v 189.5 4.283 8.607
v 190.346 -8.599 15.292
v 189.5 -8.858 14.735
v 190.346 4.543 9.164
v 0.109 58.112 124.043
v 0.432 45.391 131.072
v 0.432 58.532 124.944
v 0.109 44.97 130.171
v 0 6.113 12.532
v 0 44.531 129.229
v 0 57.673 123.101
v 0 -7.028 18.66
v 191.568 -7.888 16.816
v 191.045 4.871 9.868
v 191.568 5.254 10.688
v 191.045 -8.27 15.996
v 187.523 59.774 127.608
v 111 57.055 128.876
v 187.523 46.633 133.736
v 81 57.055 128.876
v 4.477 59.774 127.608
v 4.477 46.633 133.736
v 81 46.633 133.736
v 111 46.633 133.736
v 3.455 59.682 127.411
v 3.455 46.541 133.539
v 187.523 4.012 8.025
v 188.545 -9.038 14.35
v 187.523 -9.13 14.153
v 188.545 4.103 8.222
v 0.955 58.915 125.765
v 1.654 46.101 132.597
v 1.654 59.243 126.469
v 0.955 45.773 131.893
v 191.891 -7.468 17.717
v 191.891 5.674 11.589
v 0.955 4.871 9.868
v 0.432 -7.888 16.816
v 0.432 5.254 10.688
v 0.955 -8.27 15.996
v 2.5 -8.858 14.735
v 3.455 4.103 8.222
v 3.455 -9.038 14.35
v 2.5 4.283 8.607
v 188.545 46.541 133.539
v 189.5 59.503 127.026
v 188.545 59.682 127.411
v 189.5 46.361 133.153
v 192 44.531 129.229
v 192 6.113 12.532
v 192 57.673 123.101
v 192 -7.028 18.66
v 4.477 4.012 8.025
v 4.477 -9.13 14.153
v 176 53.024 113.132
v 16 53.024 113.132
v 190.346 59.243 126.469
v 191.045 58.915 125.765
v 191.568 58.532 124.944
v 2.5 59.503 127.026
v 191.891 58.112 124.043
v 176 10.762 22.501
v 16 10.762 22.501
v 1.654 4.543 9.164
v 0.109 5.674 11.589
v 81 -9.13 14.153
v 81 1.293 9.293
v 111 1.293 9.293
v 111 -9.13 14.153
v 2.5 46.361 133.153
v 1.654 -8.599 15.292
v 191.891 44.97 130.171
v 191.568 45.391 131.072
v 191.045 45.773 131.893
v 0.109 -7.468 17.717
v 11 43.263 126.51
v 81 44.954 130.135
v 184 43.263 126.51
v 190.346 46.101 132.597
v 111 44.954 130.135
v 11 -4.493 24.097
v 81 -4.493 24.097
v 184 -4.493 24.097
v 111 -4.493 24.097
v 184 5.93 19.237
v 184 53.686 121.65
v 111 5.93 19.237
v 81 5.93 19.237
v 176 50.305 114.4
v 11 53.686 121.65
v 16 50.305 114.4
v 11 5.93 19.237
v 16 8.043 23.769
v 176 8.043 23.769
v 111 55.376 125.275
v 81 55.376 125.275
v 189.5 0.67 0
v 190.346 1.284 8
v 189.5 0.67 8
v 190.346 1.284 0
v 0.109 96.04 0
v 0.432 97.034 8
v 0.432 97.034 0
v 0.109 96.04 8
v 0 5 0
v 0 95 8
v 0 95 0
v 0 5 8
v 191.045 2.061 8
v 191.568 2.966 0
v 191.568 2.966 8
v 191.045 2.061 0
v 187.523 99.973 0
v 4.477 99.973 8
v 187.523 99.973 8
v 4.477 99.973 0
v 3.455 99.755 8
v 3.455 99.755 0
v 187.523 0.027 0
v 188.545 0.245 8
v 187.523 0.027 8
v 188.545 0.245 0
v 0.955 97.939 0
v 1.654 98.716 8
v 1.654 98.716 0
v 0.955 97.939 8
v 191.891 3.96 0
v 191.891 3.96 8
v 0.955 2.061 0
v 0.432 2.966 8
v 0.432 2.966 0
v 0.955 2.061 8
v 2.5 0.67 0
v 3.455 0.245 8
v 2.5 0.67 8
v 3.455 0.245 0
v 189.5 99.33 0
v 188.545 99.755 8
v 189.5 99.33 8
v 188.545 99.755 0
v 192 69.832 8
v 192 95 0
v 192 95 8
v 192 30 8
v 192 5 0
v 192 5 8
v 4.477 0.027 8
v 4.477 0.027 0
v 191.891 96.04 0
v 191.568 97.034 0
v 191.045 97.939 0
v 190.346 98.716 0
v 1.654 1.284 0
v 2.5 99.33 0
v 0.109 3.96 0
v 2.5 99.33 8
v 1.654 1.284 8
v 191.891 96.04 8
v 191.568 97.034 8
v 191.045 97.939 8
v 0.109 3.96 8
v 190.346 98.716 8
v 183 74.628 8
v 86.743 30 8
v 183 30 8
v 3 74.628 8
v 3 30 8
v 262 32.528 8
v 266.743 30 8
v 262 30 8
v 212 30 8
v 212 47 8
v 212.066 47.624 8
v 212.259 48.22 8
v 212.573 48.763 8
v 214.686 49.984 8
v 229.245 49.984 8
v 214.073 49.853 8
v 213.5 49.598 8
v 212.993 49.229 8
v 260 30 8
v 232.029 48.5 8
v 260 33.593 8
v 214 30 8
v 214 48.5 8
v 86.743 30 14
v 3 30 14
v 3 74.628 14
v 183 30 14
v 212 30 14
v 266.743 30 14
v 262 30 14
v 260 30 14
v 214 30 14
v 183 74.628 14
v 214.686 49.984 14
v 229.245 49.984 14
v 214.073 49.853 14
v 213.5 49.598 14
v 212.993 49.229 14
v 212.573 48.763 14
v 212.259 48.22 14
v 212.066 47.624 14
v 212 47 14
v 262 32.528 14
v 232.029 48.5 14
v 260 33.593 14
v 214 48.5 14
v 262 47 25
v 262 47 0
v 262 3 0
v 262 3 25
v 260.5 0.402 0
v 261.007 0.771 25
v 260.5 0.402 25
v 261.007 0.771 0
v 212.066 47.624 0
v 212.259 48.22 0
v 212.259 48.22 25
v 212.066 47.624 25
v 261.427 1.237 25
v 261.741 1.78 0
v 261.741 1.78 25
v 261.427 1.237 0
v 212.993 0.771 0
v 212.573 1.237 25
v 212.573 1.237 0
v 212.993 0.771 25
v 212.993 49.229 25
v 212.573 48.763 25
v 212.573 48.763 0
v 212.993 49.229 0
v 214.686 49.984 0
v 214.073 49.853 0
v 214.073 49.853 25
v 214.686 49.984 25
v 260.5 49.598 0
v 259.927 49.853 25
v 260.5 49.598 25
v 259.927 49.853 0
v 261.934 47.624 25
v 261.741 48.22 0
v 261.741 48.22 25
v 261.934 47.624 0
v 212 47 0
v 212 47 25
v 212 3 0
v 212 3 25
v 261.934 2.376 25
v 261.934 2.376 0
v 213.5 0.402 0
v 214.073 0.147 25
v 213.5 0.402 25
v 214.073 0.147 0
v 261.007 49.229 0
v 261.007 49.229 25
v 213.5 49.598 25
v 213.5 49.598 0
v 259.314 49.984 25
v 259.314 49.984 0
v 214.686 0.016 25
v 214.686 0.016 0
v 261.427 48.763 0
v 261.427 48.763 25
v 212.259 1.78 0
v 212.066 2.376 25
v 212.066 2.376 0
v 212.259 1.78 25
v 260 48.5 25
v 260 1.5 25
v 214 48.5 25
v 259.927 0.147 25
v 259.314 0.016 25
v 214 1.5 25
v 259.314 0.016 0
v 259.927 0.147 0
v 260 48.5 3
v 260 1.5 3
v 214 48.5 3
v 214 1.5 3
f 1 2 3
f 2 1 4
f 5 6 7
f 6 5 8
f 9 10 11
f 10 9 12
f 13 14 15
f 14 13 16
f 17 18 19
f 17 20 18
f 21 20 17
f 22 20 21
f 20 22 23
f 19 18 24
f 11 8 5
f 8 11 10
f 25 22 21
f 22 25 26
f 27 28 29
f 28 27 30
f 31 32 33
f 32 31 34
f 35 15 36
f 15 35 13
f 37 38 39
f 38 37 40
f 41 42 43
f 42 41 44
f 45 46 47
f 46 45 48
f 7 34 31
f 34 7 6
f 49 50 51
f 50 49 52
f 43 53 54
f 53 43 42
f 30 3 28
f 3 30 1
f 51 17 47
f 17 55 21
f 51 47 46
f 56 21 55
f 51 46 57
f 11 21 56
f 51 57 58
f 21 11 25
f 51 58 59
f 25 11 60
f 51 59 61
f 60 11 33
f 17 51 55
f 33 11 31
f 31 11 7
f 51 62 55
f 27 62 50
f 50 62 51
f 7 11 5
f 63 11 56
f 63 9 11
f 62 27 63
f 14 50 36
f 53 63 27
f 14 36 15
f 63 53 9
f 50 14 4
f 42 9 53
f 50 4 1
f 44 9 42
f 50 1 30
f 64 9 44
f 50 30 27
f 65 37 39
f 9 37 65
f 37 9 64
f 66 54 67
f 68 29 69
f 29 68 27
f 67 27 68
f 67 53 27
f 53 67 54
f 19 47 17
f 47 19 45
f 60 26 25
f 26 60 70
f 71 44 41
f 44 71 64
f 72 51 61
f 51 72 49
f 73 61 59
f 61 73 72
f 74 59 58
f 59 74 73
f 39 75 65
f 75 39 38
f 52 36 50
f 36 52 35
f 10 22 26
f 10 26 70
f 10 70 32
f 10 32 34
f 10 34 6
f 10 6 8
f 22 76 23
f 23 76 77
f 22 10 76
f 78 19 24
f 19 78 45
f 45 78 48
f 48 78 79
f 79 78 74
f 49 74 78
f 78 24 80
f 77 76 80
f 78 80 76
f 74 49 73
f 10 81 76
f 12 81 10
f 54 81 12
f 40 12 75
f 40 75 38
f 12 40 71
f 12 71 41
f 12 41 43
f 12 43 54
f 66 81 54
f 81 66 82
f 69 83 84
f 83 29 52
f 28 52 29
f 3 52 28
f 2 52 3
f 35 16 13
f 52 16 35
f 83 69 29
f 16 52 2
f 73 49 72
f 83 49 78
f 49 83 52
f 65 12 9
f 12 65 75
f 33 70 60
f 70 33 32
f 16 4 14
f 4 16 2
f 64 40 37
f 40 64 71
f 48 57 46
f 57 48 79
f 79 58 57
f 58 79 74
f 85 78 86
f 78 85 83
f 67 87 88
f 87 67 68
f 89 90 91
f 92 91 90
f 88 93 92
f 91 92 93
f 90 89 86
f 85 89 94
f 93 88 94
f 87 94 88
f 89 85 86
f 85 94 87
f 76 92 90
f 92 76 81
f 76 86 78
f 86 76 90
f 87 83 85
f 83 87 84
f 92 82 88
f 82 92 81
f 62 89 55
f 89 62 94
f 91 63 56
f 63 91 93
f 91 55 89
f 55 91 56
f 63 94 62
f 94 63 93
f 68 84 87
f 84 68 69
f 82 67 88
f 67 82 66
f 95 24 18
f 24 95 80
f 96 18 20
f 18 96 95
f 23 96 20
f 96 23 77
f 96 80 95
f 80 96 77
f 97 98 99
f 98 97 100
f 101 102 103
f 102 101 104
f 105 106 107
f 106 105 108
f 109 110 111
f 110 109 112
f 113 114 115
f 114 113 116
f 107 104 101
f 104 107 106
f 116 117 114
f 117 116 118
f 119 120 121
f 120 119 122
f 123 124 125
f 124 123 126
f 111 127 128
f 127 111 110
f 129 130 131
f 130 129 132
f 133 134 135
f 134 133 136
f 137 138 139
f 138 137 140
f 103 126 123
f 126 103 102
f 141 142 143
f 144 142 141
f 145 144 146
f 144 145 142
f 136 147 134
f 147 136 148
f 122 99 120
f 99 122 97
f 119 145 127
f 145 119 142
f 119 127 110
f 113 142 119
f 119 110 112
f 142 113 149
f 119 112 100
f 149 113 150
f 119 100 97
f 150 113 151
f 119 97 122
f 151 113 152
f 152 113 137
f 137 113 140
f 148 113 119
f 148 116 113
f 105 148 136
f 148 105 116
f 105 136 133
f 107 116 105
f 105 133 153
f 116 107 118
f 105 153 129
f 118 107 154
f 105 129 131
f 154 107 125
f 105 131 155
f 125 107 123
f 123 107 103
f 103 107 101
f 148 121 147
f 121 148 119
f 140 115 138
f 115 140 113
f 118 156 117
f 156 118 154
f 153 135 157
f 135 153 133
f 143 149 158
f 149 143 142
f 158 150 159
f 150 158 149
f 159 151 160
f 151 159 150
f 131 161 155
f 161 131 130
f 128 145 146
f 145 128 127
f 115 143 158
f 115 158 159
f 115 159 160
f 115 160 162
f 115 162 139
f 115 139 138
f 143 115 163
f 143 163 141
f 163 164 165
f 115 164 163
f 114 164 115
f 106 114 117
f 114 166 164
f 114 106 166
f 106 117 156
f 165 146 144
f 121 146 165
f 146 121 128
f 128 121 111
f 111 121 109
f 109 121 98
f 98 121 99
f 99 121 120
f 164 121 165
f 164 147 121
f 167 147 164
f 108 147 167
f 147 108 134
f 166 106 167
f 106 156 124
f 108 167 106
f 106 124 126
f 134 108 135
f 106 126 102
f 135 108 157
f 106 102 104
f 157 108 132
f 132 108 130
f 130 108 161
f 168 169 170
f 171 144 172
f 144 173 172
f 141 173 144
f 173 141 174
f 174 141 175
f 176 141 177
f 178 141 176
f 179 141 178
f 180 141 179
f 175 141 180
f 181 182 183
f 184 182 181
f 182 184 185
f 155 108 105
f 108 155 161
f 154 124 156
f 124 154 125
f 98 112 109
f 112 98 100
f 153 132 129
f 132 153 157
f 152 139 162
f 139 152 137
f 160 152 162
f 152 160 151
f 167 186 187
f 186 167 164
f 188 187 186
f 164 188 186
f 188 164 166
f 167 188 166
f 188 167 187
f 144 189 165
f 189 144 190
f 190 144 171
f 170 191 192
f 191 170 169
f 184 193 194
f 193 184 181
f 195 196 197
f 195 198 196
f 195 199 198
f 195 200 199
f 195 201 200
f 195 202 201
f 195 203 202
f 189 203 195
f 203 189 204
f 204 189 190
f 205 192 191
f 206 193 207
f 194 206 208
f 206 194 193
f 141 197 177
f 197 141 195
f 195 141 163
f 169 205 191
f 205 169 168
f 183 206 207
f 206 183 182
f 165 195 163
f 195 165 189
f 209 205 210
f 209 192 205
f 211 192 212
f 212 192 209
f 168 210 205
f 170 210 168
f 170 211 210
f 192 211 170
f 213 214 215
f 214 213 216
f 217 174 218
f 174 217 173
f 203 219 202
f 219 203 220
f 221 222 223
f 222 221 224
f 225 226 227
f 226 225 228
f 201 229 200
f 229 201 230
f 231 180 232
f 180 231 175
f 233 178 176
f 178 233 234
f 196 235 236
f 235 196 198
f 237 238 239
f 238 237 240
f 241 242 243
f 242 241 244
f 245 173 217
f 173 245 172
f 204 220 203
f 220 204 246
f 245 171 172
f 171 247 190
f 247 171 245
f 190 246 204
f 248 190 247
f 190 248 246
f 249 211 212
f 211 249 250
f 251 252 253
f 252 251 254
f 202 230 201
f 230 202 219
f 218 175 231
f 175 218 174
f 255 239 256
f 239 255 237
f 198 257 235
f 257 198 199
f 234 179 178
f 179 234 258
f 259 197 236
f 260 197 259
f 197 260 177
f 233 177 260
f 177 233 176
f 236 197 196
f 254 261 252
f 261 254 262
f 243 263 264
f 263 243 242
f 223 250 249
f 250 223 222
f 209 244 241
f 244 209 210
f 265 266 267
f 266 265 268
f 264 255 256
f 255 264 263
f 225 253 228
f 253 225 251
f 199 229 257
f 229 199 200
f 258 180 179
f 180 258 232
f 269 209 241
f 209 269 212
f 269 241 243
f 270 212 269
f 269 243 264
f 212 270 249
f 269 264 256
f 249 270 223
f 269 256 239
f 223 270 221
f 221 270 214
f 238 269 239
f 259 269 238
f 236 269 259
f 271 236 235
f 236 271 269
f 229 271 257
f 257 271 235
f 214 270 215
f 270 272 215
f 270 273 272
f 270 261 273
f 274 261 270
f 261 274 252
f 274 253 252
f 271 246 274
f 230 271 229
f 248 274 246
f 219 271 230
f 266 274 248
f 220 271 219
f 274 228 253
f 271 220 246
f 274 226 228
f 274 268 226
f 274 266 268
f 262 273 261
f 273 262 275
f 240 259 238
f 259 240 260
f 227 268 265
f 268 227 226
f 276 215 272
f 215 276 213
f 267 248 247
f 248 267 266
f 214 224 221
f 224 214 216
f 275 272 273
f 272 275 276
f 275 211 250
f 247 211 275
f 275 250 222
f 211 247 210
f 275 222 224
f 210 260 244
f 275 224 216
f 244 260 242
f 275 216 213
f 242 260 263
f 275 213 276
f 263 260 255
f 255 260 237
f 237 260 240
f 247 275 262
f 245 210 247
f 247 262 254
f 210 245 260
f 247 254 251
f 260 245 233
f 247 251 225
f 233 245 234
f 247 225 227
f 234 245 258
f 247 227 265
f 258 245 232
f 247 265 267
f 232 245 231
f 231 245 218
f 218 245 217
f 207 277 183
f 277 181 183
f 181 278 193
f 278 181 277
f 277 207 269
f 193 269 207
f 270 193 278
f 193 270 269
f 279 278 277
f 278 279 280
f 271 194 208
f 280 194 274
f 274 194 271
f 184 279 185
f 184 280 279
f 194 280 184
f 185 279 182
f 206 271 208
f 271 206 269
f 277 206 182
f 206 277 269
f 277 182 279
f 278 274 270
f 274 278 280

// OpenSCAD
// Story Printer — Display Stand (Kid-Friendly Booth)
// Houses: 7" HDMI Display (angled for kids), mic clip area
// Designed for Bambu Labs P1S (256x256x256mm build volume)
//
// Print settings: 0.2mm layer height, 15% infill, tree supports
// Material: PLA or PETG
// Print orientation: lay flat on the back for minimal supports

/* [Display Dimensions (mm)] */
// 7" HDMI display (common Raspberry Pi / Jetson display)
display_w = 170;    // screen width
display_h = 110;    // screen height
display_t = 10;     // screen thickness (including PCB)

/* [Stand Parameters] */
wall = 3;
clearance = 1.5;
corner_r = 5;

// Viewing angle (tilted back for kids to see while standing)
tilt_angle = 25;    // degrees from vertical

// Bezel lip to hold display in
lip = 5;            // how much the frame overlaps the screen edge
bezel_w = 8;        // frame width around the screen

// Stand base dimensions
base_depth = 100;   // how far back the stand extends on the table
base_height = 8;    // thickness of the base plate

/* [Cable Routing] */
cable_slot_w = 30;  // slot in the back for HDMI + USB cables
cable_slot_h = 15;

/* [Mic Holder] */
// Small clip on top to rest the Rode TX transmitter or a table mic
mic_clip_w = 50;
mic_clip_d = 50;
mic_clip_h = 25;
mic_clip_inner_w = 46; // Rode TX is 44mm wide
mic_clip_inner_d = 47; // Rode TX is 45.3mm deep

/* [Computed] */
// Frame outer dimensions
frame_w = display_w + bezel_w * 2 + wall * 2;
frame_h = display_h + bezel_w * 2 + wall * 2;
frame_t = display_t + clearance + wall;

// Stand total height when tilted
stand_height = frame_h * cos(tilt_angle) + frame_t * sin(tilt_angle) + base_height;
stand_depth_total = frame_h * sin(tilt_angle) + frame_t * cos(tilt_angle) + base_depth * 0.3;

echo(str("Frame dimensions: ", frame_w, " x ", frame_h, " x ", frame_t, " mm"));
echo(str("Stand height: ~", stand_height, " mm"));
echo(str("Fits P1S plate: ", frame_w <= 256 && frame_h <= 256 ? "YES" : "SPLIT PRINT"));

// -----------------------------------------------------------------------
// Modules
// -----------------------------------------------------------------------
module rounded_rect(w, h, r) {
    hull() {
        translate([r, r, 0]) circle(r=r, $fn=30);
        translate([w-r, r, 0]) circle(r=r, $fn=30);
        translate([r, h-r, 0]) circle(r=r, $fn=30);
        translate([w-r, h-r, 0]) circle(r=r, $fn=30);
    }
}

module rounded_box_3d(size, r) {
    hull() {
        for (x = [r, size[0]-r])
            for (y = [r, size[1]-r])
                translate([x, y, 0])
                    cylinder(r=r, h=size[2], $fn=30);
    }
}

// -----------------------------------------------------------------------
// Display frame (the part that holds the screen)
// -----------------------------------------------------------------------
module display_frame() {
    difference() {
        // Outer frame
        rounded_box_3d([frame_w, frame_h, frame_t], corner_r);

        // Screen pocket (recessed from the front)
        translate([bezel_w + wall, bezel_w + wall, wall])
            cube([display_w + clearance * 2, display_h + clearance * 2, display_t + clearance + 1]);

        // Viewing window (cut through the front face)
        translate([bezel_w + wall + lip, bezel_w + wall + lip, -1])
            cube([display_w - lip * 2, display_h - lip * 2, wall + 2]);

        // Cable exit slot (bottom edge of frame, centered)
        translate([frame_w/2 - cable_slot_w/2, -1, wall])
            cube([cable_slot_w, bezel_w + wall + 2, cable_slot_h]);

        // Cable exit slot (back, for HDMI ribbon)
        translate([frame_w/2 - cable_slot_w/2, frame_h - wall - 1, wall])
            cube([cable_slot_w, wall + 2, cable_slot_h]);
    }
}

// -----------------------------------------------------------------------
// Support struts (triangular, connect frame to base)
// -----------------------------------------------------------------------
module support_strut(height, depth, thickness) {
    linear_extrude(height=thickness)
        polygon(points=[
            [0, 0],
            [0, depth],
            [height, 0]
        ]);
}

// -----------------------------------------------------------------------
// Base plate with angled frame
// -----------------------------------------------------------------------
module display_stand() {
    // Base plate (sits flat on table)
    translate([0, 0, 0])
        rounded_box_3d([frame_w, base_depth, base_height], corner_r);

    // Frame, tilted back
    translate([0, base_height * 0.5, base_height])
        rotate([90 - tilt_angle, 0, 0])
            display_frame();

    // Left support strut
    strut_h = frame_h * cos(tilt_angle) * 0.7;
    strut_d = frame_h * sin(tilt_angle) * 0.8;
    translate([wall, base_depth * 0.3, base_height])
        rotate([0, 0, 0])
            support_strut(strut_h, strut_d, wall * 2);

    // Right support strut
    translate([frame_w - wall * 3, base_depth * 0.3, base_height])
        rotate([0, 0, 0])
            support_strut(strut_h, strut_d, wall * 2);
}

// -----------------------------------------------------------------------
// Mic holder clip (sits on top of the frame or beside it)
// -----------------------------------------------------------------------
module mic_clip() {
    difference() {
        // Outer box
        rounded_box_3d([mic_clip_w, mic_clip_d, mic_clip_h], 3);

        // Inner pocket for the Rode TX
        translate([
            (mic_clip_w - mic_clip_inner_w) / 2,
            (mic_clip_d - mic_clip_inner_d) / 2,
            wall
        ])
            cube([mic_clip_inner_w, mic_clip_inner_d, mic_clip_h]);
    }
}

// -----------------------------------------------------------------------
// Render
// -----------------------------------------------------------------------

// Stand with display
display_stand();

// Mic clip (positioned to the side — print separately)
translate([frame_w + 20, 0, 0])
    mic_clip();

// Ghost display for fit checking
%translate([bezel_w + wall, base_height * 0.5, base_height])
    rotate([90 - tilt_angle, 0, 0])
        translate([bezel_w + wall, bezel_w + wall, wall])
            color("Black", 0.3) cube([display_w, display_h, display_t]);
